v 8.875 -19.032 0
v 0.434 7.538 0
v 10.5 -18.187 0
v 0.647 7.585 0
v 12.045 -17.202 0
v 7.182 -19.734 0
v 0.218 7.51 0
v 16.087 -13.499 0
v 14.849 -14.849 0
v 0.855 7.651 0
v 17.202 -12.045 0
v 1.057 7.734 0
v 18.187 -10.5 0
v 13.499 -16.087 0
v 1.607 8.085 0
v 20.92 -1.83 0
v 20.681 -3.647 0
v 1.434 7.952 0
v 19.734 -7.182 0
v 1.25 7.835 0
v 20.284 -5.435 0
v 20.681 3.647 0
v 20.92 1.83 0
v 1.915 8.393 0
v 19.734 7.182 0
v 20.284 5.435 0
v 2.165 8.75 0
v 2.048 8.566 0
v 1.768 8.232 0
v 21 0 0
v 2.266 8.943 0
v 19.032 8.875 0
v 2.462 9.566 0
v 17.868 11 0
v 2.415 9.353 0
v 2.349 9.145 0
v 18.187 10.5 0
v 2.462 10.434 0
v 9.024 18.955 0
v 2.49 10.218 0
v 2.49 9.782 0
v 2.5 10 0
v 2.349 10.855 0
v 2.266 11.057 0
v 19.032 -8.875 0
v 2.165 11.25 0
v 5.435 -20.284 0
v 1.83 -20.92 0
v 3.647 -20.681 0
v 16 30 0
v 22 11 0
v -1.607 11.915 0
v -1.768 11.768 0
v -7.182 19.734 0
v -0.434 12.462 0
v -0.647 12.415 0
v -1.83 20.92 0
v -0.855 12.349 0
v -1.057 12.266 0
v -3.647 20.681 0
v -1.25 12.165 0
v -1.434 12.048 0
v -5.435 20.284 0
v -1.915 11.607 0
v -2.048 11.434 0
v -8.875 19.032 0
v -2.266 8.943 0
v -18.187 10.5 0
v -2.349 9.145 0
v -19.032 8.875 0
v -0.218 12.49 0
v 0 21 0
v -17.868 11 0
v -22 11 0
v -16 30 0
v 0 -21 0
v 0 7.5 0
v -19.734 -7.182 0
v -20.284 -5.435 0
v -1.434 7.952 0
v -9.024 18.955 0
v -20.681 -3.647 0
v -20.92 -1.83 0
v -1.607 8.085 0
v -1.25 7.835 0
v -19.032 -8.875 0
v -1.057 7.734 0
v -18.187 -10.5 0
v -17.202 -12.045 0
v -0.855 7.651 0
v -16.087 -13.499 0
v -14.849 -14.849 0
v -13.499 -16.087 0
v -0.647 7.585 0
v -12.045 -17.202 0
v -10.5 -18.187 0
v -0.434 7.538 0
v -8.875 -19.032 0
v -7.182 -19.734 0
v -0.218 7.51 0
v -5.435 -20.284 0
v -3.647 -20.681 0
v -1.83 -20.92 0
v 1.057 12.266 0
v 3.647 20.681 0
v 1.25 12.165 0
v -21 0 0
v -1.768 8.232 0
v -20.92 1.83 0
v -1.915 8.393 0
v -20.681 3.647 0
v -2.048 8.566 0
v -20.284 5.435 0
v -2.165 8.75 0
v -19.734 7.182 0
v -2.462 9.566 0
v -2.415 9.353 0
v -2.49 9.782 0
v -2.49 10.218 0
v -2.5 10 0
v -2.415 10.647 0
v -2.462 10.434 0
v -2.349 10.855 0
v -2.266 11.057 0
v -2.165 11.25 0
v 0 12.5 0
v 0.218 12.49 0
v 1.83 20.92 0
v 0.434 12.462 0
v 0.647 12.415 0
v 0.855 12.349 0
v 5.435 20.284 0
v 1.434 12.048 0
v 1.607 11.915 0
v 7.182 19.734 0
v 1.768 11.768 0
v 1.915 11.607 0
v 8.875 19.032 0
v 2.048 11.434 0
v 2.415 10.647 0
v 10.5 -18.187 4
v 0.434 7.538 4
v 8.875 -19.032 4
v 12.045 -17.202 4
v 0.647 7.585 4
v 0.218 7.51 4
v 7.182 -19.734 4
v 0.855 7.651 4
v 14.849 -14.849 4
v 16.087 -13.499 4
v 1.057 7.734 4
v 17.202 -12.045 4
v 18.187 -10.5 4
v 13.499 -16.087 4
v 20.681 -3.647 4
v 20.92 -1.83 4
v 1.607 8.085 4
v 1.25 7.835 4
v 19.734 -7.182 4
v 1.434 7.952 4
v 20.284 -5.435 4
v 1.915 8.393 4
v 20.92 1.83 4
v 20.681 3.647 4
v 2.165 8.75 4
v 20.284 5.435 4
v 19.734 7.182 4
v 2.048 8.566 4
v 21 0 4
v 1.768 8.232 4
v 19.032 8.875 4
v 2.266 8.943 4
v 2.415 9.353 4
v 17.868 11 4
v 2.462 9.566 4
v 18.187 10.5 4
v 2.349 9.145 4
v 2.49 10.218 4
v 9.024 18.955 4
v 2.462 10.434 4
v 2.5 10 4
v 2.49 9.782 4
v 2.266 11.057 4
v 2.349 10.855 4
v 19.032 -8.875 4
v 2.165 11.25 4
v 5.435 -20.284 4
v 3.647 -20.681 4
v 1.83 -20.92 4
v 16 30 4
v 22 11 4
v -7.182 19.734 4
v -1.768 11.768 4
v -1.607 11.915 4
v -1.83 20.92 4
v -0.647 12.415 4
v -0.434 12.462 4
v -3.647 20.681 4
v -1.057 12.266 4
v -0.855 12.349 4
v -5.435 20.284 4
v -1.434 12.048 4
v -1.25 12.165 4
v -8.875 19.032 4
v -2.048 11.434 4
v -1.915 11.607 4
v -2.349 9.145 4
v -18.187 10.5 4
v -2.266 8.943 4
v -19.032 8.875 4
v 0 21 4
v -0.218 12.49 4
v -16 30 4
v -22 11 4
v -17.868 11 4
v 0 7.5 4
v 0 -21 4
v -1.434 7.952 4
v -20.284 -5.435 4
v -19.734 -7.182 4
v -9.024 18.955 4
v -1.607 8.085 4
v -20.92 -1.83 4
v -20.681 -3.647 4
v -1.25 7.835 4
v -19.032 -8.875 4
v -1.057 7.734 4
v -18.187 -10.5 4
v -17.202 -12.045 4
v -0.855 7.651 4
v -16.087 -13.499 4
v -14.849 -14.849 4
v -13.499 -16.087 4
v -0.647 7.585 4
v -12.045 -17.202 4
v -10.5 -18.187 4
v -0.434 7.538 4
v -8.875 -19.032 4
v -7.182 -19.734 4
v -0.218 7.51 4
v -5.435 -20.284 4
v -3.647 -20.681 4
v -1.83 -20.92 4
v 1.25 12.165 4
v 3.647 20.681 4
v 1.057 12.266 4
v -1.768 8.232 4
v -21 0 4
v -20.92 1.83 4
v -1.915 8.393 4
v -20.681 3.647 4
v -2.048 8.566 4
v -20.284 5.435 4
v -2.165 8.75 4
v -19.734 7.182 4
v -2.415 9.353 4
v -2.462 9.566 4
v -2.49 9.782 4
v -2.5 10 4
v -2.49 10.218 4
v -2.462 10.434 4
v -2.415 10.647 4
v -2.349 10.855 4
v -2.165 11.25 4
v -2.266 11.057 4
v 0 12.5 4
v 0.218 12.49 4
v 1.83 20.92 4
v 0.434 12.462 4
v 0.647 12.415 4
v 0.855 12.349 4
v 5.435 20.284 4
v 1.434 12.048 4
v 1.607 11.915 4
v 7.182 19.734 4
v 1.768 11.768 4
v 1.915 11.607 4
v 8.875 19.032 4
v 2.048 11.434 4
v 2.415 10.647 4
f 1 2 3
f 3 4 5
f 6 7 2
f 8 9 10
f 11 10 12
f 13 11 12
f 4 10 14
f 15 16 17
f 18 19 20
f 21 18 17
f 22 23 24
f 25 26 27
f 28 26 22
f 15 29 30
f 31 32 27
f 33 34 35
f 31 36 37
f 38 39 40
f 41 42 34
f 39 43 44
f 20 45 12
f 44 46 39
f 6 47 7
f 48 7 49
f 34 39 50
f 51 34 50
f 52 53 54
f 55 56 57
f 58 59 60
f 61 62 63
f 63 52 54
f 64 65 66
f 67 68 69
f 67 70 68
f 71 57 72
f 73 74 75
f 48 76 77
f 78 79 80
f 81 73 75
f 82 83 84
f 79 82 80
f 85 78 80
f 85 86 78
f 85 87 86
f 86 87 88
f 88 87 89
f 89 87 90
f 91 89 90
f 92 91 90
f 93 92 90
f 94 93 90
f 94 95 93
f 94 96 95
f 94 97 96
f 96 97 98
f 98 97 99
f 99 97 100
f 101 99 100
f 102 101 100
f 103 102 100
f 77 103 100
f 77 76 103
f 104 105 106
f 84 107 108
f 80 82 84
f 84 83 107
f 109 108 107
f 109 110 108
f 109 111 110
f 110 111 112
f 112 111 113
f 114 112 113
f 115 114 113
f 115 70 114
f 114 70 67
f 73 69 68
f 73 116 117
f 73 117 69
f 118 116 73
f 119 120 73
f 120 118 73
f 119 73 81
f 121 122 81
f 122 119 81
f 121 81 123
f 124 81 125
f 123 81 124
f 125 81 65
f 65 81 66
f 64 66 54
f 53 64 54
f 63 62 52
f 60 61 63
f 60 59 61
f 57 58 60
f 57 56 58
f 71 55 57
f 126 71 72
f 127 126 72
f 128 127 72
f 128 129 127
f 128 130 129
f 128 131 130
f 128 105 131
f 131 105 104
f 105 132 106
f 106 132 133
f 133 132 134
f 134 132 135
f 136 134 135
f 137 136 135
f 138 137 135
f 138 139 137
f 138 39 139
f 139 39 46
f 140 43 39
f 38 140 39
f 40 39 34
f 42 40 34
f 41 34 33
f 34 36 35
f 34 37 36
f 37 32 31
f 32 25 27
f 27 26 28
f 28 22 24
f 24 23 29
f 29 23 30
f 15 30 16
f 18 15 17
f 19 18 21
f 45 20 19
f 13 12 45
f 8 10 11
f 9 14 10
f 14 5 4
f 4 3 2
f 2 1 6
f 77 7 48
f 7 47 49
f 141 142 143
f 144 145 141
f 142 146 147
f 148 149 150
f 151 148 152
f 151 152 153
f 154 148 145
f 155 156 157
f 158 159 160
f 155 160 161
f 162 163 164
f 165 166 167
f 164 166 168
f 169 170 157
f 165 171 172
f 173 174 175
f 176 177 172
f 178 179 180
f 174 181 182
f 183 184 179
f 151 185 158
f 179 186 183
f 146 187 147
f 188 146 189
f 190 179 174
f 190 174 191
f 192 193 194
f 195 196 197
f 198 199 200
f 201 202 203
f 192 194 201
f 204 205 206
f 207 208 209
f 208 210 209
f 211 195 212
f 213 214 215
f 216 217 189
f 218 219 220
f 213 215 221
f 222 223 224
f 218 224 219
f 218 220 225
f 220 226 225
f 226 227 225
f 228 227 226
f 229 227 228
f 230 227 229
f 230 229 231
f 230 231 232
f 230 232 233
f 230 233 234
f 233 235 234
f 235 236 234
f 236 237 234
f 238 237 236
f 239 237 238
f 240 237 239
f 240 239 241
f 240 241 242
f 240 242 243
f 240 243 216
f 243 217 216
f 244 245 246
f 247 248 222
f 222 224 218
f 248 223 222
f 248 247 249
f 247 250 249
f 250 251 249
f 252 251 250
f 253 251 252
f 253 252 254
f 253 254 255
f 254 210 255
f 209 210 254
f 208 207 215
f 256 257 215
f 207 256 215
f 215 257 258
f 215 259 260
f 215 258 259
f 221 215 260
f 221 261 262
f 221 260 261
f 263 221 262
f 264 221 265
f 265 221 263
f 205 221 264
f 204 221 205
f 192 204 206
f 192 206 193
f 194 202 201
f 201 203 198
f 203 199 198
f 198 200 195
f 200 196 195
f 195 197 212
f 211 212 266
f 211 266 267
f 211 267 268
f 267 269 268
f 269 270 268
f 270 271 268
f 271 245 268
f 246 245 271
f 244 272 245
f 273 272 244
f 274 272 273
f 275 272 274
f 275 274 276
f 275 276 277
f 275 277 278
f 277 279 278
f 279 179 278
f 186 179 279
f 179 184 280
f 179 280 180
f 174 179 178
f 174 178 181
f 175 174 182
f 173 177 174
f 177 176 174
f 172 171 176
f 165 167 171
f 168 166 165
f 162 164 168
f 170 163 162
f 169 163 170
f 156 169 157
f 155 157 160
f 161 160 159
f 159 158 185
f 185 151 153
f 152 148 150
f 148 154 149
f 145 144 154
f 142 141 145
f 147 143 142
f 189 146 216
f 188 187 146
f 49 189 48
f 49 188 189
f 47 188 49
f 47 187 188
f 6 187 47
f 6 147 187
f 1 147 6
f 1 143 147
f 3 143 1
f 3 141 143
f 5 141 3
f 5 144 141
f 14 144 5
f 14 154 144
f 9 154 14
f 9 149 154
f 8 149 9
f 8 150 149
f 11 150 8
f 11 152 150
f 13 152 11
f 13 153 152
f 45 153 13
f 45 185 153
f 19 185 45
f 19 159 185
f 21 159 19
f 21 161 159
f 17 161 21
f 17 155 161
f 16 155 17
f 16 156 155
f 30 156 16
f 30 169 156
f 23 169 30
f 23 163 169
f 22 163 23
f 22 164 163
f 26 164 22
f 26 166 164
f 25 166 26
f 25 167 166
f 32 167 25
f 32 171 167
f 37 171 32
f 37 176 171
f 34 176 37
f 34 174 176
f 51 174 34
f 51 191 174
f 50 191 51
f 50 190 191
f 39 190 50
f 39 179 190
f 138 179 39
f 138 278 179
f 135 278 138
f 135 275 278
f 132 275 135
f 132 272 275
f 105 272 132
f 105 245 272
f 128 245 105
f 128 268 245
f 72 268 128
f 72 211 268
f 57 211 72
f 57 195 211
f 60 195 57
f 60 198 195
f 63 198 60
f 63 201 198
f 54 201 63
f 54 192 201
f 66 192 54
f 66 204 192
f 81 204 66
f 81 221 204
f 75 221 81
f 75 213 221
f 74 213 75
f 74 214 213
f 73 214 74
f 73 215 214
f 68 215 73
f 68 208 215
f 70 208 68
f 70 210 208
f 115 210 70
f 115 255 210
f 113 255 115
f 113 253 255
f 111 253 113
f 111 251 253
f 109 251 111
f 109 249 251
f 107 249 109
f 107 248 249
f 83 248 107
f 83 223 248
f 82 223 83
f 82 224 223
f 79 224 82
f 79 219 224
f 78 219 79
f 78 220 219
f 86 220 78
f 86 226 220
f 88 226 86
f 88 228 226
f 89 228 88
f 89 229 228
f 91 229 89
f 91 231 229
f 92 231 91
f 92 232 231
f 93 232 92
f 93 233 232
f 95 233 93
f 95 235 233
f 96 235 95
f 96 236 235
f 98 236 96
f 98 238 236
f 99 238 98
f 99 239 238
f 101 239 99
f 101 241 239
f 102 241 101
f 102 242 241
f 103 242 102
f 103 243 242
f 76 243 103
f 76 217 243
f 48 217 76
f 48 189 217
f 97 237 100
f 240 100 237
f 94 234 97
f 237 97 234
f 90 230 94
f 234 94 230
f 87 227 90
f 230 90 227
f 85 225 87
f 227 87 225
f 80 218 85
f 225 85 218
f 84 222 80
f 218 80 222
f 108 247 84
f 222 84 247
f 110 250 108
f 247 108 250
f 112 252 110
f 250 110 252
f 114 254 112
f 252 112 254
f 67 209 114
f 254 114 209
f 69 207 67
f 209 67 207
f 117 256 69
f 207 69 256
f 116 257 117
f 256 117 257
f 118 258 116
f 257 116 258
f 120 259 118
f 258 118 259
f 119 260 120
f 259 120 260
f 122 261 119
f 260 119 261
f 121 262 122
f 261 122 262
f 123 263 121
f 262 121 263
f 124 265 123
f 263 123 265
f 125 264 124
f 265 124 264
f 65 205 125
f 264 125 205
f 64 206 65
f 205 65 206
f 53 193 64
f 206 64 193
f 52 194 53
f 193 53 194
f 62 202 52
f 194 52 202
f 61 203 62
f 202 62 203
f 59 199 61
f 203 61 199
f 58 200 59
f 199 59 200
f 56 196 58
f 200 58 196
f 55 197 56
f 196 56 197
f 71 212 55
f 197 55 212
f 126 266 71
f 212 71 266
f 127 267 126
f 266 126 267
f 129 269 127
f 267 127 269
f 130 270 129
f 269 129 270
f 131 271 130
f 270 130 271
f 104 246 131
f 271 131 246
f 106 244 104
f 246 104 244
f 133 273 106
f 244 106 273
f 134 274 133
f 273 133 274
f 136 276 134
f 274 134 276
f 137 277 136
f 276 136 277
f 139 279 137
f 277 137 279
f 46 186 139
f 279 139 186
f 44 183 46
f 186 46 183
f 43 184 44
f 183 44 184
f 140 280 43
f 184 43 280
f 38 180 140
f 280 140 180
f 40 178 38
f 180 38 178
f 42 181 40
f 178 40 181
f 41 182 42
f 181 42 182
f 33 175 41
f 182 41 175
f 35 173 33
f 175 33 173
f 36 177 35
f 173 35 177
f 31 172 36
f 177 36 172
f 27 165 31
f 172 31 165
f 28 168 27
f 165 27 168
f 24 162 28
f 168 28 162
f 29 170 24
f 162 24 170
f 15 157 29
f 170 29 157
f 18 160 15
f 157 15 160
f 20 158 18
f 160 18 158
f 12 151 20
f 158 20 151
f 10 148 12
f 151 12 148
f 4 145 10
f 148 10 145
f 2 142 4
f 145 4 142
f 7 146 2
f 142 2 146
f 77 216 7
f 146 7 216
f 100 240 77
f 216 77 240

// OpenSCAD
// ============================================================
//  LuxeStyle - Tier-Silhouetten-Anhaenger (eigene, generische Formen)
//  Einfache Umrisse aus Grundformen - gehoeren dir, frei verkaufbar.
//  Rendern:  openscad -o out.stl -D 'kind="cat"' -D 'col="Gold"' animal.scad
// ============================================================

kind  = "cat";    // cat, bear, rabbit, fish, paw, dog, heart, star
col   = "Gold";   // Vorschau-Farbe (CSS-Farbname)
thick = 4;        // Materialstaerke in mm
ring_d = 5;       // Aufhaenge-Loch in mm
$fn = 72;

module sh_cat() {
    union() {
        circle(d = 42);
        for (s = [-1, 1]) translate([s * 13, 13])
            polygon([[-9, -2], [9, -2], [s * 3, 17]]);
    }
}
module sh_bear() {
    union() {
        circle(d = 42);
        for (s = [-1, 1]) translate([s * 16, 16]) circle(d = 20);
    }
}
module sh_rabbit() {
    union() {
        circle(d = 38);
        for (s = [-1, 1]) translate([s * 9, 28]) scale([1, 2.2]) circle(d = 12);
    }
}
module sh_fish() {
    union() {
        scale([1.3, 1]) circle(d = 40);
        translate([-30, 0]) polygon([[0, 0], [-15, 13], [-15, -13]]);
    }
}
module sh_paw() {
    union() {
        translate([0, -4]) scale([1.25, 1]) circle(d = 30);
        for (a = [-26, -9, 9, 26]) rotate(a) translate([0, 22]) circle(d = 12);
    }
}
module sh_dog() {
    union() {
        circle(d = 40);
        for (s = [-1, 1]) translate([s * 20, 2]) scale([1, 1.8]) circle(d = 16);
    }
}
module sh_heart() {
    union() {
        for (s = [-1, 1]) translate([s * 11, 8]) circle(d = 24);
        polygon([[-22, 7], [22, 7], [0, -26]]);
    }
}
module sh_star() {
    r1 = 24; r2 = 10;
    points = [for (i = [0:9]) let(a = i * 36, r = (i % 2 == 0) ? r1 : r2)
        [r * cos(a + 90), r * sin(a + 90)]];
    polygon(points);
}

module shape2d() {
    if (kind == "cat") sh_cat();
    else if (kind == "bear") sh_bear();
    else if (kind == "rabbit") sh_rabbit();
    else if (kind == "fish") sh_fish();
    else if (kind == "paw") sh_paw();
    else if (kind == "dog") sh_dog();
    else if (kind == "heart") sh_heart();
    else if (kind == "star") sh_star();
}

function hole_pos() =
    (kind == "fish") ? [6, 4] :
    (kind == "paw")  ? [0, -2] :
    (kind == "heart")? [0, -2] :
    (kind == "star") ? [0, 6] :
    [0, 10];

color(col)
linear_extrude(thick)
difference() {
    shape2d();
    translate(hole_pos()) circle(d = ring_d);
}
